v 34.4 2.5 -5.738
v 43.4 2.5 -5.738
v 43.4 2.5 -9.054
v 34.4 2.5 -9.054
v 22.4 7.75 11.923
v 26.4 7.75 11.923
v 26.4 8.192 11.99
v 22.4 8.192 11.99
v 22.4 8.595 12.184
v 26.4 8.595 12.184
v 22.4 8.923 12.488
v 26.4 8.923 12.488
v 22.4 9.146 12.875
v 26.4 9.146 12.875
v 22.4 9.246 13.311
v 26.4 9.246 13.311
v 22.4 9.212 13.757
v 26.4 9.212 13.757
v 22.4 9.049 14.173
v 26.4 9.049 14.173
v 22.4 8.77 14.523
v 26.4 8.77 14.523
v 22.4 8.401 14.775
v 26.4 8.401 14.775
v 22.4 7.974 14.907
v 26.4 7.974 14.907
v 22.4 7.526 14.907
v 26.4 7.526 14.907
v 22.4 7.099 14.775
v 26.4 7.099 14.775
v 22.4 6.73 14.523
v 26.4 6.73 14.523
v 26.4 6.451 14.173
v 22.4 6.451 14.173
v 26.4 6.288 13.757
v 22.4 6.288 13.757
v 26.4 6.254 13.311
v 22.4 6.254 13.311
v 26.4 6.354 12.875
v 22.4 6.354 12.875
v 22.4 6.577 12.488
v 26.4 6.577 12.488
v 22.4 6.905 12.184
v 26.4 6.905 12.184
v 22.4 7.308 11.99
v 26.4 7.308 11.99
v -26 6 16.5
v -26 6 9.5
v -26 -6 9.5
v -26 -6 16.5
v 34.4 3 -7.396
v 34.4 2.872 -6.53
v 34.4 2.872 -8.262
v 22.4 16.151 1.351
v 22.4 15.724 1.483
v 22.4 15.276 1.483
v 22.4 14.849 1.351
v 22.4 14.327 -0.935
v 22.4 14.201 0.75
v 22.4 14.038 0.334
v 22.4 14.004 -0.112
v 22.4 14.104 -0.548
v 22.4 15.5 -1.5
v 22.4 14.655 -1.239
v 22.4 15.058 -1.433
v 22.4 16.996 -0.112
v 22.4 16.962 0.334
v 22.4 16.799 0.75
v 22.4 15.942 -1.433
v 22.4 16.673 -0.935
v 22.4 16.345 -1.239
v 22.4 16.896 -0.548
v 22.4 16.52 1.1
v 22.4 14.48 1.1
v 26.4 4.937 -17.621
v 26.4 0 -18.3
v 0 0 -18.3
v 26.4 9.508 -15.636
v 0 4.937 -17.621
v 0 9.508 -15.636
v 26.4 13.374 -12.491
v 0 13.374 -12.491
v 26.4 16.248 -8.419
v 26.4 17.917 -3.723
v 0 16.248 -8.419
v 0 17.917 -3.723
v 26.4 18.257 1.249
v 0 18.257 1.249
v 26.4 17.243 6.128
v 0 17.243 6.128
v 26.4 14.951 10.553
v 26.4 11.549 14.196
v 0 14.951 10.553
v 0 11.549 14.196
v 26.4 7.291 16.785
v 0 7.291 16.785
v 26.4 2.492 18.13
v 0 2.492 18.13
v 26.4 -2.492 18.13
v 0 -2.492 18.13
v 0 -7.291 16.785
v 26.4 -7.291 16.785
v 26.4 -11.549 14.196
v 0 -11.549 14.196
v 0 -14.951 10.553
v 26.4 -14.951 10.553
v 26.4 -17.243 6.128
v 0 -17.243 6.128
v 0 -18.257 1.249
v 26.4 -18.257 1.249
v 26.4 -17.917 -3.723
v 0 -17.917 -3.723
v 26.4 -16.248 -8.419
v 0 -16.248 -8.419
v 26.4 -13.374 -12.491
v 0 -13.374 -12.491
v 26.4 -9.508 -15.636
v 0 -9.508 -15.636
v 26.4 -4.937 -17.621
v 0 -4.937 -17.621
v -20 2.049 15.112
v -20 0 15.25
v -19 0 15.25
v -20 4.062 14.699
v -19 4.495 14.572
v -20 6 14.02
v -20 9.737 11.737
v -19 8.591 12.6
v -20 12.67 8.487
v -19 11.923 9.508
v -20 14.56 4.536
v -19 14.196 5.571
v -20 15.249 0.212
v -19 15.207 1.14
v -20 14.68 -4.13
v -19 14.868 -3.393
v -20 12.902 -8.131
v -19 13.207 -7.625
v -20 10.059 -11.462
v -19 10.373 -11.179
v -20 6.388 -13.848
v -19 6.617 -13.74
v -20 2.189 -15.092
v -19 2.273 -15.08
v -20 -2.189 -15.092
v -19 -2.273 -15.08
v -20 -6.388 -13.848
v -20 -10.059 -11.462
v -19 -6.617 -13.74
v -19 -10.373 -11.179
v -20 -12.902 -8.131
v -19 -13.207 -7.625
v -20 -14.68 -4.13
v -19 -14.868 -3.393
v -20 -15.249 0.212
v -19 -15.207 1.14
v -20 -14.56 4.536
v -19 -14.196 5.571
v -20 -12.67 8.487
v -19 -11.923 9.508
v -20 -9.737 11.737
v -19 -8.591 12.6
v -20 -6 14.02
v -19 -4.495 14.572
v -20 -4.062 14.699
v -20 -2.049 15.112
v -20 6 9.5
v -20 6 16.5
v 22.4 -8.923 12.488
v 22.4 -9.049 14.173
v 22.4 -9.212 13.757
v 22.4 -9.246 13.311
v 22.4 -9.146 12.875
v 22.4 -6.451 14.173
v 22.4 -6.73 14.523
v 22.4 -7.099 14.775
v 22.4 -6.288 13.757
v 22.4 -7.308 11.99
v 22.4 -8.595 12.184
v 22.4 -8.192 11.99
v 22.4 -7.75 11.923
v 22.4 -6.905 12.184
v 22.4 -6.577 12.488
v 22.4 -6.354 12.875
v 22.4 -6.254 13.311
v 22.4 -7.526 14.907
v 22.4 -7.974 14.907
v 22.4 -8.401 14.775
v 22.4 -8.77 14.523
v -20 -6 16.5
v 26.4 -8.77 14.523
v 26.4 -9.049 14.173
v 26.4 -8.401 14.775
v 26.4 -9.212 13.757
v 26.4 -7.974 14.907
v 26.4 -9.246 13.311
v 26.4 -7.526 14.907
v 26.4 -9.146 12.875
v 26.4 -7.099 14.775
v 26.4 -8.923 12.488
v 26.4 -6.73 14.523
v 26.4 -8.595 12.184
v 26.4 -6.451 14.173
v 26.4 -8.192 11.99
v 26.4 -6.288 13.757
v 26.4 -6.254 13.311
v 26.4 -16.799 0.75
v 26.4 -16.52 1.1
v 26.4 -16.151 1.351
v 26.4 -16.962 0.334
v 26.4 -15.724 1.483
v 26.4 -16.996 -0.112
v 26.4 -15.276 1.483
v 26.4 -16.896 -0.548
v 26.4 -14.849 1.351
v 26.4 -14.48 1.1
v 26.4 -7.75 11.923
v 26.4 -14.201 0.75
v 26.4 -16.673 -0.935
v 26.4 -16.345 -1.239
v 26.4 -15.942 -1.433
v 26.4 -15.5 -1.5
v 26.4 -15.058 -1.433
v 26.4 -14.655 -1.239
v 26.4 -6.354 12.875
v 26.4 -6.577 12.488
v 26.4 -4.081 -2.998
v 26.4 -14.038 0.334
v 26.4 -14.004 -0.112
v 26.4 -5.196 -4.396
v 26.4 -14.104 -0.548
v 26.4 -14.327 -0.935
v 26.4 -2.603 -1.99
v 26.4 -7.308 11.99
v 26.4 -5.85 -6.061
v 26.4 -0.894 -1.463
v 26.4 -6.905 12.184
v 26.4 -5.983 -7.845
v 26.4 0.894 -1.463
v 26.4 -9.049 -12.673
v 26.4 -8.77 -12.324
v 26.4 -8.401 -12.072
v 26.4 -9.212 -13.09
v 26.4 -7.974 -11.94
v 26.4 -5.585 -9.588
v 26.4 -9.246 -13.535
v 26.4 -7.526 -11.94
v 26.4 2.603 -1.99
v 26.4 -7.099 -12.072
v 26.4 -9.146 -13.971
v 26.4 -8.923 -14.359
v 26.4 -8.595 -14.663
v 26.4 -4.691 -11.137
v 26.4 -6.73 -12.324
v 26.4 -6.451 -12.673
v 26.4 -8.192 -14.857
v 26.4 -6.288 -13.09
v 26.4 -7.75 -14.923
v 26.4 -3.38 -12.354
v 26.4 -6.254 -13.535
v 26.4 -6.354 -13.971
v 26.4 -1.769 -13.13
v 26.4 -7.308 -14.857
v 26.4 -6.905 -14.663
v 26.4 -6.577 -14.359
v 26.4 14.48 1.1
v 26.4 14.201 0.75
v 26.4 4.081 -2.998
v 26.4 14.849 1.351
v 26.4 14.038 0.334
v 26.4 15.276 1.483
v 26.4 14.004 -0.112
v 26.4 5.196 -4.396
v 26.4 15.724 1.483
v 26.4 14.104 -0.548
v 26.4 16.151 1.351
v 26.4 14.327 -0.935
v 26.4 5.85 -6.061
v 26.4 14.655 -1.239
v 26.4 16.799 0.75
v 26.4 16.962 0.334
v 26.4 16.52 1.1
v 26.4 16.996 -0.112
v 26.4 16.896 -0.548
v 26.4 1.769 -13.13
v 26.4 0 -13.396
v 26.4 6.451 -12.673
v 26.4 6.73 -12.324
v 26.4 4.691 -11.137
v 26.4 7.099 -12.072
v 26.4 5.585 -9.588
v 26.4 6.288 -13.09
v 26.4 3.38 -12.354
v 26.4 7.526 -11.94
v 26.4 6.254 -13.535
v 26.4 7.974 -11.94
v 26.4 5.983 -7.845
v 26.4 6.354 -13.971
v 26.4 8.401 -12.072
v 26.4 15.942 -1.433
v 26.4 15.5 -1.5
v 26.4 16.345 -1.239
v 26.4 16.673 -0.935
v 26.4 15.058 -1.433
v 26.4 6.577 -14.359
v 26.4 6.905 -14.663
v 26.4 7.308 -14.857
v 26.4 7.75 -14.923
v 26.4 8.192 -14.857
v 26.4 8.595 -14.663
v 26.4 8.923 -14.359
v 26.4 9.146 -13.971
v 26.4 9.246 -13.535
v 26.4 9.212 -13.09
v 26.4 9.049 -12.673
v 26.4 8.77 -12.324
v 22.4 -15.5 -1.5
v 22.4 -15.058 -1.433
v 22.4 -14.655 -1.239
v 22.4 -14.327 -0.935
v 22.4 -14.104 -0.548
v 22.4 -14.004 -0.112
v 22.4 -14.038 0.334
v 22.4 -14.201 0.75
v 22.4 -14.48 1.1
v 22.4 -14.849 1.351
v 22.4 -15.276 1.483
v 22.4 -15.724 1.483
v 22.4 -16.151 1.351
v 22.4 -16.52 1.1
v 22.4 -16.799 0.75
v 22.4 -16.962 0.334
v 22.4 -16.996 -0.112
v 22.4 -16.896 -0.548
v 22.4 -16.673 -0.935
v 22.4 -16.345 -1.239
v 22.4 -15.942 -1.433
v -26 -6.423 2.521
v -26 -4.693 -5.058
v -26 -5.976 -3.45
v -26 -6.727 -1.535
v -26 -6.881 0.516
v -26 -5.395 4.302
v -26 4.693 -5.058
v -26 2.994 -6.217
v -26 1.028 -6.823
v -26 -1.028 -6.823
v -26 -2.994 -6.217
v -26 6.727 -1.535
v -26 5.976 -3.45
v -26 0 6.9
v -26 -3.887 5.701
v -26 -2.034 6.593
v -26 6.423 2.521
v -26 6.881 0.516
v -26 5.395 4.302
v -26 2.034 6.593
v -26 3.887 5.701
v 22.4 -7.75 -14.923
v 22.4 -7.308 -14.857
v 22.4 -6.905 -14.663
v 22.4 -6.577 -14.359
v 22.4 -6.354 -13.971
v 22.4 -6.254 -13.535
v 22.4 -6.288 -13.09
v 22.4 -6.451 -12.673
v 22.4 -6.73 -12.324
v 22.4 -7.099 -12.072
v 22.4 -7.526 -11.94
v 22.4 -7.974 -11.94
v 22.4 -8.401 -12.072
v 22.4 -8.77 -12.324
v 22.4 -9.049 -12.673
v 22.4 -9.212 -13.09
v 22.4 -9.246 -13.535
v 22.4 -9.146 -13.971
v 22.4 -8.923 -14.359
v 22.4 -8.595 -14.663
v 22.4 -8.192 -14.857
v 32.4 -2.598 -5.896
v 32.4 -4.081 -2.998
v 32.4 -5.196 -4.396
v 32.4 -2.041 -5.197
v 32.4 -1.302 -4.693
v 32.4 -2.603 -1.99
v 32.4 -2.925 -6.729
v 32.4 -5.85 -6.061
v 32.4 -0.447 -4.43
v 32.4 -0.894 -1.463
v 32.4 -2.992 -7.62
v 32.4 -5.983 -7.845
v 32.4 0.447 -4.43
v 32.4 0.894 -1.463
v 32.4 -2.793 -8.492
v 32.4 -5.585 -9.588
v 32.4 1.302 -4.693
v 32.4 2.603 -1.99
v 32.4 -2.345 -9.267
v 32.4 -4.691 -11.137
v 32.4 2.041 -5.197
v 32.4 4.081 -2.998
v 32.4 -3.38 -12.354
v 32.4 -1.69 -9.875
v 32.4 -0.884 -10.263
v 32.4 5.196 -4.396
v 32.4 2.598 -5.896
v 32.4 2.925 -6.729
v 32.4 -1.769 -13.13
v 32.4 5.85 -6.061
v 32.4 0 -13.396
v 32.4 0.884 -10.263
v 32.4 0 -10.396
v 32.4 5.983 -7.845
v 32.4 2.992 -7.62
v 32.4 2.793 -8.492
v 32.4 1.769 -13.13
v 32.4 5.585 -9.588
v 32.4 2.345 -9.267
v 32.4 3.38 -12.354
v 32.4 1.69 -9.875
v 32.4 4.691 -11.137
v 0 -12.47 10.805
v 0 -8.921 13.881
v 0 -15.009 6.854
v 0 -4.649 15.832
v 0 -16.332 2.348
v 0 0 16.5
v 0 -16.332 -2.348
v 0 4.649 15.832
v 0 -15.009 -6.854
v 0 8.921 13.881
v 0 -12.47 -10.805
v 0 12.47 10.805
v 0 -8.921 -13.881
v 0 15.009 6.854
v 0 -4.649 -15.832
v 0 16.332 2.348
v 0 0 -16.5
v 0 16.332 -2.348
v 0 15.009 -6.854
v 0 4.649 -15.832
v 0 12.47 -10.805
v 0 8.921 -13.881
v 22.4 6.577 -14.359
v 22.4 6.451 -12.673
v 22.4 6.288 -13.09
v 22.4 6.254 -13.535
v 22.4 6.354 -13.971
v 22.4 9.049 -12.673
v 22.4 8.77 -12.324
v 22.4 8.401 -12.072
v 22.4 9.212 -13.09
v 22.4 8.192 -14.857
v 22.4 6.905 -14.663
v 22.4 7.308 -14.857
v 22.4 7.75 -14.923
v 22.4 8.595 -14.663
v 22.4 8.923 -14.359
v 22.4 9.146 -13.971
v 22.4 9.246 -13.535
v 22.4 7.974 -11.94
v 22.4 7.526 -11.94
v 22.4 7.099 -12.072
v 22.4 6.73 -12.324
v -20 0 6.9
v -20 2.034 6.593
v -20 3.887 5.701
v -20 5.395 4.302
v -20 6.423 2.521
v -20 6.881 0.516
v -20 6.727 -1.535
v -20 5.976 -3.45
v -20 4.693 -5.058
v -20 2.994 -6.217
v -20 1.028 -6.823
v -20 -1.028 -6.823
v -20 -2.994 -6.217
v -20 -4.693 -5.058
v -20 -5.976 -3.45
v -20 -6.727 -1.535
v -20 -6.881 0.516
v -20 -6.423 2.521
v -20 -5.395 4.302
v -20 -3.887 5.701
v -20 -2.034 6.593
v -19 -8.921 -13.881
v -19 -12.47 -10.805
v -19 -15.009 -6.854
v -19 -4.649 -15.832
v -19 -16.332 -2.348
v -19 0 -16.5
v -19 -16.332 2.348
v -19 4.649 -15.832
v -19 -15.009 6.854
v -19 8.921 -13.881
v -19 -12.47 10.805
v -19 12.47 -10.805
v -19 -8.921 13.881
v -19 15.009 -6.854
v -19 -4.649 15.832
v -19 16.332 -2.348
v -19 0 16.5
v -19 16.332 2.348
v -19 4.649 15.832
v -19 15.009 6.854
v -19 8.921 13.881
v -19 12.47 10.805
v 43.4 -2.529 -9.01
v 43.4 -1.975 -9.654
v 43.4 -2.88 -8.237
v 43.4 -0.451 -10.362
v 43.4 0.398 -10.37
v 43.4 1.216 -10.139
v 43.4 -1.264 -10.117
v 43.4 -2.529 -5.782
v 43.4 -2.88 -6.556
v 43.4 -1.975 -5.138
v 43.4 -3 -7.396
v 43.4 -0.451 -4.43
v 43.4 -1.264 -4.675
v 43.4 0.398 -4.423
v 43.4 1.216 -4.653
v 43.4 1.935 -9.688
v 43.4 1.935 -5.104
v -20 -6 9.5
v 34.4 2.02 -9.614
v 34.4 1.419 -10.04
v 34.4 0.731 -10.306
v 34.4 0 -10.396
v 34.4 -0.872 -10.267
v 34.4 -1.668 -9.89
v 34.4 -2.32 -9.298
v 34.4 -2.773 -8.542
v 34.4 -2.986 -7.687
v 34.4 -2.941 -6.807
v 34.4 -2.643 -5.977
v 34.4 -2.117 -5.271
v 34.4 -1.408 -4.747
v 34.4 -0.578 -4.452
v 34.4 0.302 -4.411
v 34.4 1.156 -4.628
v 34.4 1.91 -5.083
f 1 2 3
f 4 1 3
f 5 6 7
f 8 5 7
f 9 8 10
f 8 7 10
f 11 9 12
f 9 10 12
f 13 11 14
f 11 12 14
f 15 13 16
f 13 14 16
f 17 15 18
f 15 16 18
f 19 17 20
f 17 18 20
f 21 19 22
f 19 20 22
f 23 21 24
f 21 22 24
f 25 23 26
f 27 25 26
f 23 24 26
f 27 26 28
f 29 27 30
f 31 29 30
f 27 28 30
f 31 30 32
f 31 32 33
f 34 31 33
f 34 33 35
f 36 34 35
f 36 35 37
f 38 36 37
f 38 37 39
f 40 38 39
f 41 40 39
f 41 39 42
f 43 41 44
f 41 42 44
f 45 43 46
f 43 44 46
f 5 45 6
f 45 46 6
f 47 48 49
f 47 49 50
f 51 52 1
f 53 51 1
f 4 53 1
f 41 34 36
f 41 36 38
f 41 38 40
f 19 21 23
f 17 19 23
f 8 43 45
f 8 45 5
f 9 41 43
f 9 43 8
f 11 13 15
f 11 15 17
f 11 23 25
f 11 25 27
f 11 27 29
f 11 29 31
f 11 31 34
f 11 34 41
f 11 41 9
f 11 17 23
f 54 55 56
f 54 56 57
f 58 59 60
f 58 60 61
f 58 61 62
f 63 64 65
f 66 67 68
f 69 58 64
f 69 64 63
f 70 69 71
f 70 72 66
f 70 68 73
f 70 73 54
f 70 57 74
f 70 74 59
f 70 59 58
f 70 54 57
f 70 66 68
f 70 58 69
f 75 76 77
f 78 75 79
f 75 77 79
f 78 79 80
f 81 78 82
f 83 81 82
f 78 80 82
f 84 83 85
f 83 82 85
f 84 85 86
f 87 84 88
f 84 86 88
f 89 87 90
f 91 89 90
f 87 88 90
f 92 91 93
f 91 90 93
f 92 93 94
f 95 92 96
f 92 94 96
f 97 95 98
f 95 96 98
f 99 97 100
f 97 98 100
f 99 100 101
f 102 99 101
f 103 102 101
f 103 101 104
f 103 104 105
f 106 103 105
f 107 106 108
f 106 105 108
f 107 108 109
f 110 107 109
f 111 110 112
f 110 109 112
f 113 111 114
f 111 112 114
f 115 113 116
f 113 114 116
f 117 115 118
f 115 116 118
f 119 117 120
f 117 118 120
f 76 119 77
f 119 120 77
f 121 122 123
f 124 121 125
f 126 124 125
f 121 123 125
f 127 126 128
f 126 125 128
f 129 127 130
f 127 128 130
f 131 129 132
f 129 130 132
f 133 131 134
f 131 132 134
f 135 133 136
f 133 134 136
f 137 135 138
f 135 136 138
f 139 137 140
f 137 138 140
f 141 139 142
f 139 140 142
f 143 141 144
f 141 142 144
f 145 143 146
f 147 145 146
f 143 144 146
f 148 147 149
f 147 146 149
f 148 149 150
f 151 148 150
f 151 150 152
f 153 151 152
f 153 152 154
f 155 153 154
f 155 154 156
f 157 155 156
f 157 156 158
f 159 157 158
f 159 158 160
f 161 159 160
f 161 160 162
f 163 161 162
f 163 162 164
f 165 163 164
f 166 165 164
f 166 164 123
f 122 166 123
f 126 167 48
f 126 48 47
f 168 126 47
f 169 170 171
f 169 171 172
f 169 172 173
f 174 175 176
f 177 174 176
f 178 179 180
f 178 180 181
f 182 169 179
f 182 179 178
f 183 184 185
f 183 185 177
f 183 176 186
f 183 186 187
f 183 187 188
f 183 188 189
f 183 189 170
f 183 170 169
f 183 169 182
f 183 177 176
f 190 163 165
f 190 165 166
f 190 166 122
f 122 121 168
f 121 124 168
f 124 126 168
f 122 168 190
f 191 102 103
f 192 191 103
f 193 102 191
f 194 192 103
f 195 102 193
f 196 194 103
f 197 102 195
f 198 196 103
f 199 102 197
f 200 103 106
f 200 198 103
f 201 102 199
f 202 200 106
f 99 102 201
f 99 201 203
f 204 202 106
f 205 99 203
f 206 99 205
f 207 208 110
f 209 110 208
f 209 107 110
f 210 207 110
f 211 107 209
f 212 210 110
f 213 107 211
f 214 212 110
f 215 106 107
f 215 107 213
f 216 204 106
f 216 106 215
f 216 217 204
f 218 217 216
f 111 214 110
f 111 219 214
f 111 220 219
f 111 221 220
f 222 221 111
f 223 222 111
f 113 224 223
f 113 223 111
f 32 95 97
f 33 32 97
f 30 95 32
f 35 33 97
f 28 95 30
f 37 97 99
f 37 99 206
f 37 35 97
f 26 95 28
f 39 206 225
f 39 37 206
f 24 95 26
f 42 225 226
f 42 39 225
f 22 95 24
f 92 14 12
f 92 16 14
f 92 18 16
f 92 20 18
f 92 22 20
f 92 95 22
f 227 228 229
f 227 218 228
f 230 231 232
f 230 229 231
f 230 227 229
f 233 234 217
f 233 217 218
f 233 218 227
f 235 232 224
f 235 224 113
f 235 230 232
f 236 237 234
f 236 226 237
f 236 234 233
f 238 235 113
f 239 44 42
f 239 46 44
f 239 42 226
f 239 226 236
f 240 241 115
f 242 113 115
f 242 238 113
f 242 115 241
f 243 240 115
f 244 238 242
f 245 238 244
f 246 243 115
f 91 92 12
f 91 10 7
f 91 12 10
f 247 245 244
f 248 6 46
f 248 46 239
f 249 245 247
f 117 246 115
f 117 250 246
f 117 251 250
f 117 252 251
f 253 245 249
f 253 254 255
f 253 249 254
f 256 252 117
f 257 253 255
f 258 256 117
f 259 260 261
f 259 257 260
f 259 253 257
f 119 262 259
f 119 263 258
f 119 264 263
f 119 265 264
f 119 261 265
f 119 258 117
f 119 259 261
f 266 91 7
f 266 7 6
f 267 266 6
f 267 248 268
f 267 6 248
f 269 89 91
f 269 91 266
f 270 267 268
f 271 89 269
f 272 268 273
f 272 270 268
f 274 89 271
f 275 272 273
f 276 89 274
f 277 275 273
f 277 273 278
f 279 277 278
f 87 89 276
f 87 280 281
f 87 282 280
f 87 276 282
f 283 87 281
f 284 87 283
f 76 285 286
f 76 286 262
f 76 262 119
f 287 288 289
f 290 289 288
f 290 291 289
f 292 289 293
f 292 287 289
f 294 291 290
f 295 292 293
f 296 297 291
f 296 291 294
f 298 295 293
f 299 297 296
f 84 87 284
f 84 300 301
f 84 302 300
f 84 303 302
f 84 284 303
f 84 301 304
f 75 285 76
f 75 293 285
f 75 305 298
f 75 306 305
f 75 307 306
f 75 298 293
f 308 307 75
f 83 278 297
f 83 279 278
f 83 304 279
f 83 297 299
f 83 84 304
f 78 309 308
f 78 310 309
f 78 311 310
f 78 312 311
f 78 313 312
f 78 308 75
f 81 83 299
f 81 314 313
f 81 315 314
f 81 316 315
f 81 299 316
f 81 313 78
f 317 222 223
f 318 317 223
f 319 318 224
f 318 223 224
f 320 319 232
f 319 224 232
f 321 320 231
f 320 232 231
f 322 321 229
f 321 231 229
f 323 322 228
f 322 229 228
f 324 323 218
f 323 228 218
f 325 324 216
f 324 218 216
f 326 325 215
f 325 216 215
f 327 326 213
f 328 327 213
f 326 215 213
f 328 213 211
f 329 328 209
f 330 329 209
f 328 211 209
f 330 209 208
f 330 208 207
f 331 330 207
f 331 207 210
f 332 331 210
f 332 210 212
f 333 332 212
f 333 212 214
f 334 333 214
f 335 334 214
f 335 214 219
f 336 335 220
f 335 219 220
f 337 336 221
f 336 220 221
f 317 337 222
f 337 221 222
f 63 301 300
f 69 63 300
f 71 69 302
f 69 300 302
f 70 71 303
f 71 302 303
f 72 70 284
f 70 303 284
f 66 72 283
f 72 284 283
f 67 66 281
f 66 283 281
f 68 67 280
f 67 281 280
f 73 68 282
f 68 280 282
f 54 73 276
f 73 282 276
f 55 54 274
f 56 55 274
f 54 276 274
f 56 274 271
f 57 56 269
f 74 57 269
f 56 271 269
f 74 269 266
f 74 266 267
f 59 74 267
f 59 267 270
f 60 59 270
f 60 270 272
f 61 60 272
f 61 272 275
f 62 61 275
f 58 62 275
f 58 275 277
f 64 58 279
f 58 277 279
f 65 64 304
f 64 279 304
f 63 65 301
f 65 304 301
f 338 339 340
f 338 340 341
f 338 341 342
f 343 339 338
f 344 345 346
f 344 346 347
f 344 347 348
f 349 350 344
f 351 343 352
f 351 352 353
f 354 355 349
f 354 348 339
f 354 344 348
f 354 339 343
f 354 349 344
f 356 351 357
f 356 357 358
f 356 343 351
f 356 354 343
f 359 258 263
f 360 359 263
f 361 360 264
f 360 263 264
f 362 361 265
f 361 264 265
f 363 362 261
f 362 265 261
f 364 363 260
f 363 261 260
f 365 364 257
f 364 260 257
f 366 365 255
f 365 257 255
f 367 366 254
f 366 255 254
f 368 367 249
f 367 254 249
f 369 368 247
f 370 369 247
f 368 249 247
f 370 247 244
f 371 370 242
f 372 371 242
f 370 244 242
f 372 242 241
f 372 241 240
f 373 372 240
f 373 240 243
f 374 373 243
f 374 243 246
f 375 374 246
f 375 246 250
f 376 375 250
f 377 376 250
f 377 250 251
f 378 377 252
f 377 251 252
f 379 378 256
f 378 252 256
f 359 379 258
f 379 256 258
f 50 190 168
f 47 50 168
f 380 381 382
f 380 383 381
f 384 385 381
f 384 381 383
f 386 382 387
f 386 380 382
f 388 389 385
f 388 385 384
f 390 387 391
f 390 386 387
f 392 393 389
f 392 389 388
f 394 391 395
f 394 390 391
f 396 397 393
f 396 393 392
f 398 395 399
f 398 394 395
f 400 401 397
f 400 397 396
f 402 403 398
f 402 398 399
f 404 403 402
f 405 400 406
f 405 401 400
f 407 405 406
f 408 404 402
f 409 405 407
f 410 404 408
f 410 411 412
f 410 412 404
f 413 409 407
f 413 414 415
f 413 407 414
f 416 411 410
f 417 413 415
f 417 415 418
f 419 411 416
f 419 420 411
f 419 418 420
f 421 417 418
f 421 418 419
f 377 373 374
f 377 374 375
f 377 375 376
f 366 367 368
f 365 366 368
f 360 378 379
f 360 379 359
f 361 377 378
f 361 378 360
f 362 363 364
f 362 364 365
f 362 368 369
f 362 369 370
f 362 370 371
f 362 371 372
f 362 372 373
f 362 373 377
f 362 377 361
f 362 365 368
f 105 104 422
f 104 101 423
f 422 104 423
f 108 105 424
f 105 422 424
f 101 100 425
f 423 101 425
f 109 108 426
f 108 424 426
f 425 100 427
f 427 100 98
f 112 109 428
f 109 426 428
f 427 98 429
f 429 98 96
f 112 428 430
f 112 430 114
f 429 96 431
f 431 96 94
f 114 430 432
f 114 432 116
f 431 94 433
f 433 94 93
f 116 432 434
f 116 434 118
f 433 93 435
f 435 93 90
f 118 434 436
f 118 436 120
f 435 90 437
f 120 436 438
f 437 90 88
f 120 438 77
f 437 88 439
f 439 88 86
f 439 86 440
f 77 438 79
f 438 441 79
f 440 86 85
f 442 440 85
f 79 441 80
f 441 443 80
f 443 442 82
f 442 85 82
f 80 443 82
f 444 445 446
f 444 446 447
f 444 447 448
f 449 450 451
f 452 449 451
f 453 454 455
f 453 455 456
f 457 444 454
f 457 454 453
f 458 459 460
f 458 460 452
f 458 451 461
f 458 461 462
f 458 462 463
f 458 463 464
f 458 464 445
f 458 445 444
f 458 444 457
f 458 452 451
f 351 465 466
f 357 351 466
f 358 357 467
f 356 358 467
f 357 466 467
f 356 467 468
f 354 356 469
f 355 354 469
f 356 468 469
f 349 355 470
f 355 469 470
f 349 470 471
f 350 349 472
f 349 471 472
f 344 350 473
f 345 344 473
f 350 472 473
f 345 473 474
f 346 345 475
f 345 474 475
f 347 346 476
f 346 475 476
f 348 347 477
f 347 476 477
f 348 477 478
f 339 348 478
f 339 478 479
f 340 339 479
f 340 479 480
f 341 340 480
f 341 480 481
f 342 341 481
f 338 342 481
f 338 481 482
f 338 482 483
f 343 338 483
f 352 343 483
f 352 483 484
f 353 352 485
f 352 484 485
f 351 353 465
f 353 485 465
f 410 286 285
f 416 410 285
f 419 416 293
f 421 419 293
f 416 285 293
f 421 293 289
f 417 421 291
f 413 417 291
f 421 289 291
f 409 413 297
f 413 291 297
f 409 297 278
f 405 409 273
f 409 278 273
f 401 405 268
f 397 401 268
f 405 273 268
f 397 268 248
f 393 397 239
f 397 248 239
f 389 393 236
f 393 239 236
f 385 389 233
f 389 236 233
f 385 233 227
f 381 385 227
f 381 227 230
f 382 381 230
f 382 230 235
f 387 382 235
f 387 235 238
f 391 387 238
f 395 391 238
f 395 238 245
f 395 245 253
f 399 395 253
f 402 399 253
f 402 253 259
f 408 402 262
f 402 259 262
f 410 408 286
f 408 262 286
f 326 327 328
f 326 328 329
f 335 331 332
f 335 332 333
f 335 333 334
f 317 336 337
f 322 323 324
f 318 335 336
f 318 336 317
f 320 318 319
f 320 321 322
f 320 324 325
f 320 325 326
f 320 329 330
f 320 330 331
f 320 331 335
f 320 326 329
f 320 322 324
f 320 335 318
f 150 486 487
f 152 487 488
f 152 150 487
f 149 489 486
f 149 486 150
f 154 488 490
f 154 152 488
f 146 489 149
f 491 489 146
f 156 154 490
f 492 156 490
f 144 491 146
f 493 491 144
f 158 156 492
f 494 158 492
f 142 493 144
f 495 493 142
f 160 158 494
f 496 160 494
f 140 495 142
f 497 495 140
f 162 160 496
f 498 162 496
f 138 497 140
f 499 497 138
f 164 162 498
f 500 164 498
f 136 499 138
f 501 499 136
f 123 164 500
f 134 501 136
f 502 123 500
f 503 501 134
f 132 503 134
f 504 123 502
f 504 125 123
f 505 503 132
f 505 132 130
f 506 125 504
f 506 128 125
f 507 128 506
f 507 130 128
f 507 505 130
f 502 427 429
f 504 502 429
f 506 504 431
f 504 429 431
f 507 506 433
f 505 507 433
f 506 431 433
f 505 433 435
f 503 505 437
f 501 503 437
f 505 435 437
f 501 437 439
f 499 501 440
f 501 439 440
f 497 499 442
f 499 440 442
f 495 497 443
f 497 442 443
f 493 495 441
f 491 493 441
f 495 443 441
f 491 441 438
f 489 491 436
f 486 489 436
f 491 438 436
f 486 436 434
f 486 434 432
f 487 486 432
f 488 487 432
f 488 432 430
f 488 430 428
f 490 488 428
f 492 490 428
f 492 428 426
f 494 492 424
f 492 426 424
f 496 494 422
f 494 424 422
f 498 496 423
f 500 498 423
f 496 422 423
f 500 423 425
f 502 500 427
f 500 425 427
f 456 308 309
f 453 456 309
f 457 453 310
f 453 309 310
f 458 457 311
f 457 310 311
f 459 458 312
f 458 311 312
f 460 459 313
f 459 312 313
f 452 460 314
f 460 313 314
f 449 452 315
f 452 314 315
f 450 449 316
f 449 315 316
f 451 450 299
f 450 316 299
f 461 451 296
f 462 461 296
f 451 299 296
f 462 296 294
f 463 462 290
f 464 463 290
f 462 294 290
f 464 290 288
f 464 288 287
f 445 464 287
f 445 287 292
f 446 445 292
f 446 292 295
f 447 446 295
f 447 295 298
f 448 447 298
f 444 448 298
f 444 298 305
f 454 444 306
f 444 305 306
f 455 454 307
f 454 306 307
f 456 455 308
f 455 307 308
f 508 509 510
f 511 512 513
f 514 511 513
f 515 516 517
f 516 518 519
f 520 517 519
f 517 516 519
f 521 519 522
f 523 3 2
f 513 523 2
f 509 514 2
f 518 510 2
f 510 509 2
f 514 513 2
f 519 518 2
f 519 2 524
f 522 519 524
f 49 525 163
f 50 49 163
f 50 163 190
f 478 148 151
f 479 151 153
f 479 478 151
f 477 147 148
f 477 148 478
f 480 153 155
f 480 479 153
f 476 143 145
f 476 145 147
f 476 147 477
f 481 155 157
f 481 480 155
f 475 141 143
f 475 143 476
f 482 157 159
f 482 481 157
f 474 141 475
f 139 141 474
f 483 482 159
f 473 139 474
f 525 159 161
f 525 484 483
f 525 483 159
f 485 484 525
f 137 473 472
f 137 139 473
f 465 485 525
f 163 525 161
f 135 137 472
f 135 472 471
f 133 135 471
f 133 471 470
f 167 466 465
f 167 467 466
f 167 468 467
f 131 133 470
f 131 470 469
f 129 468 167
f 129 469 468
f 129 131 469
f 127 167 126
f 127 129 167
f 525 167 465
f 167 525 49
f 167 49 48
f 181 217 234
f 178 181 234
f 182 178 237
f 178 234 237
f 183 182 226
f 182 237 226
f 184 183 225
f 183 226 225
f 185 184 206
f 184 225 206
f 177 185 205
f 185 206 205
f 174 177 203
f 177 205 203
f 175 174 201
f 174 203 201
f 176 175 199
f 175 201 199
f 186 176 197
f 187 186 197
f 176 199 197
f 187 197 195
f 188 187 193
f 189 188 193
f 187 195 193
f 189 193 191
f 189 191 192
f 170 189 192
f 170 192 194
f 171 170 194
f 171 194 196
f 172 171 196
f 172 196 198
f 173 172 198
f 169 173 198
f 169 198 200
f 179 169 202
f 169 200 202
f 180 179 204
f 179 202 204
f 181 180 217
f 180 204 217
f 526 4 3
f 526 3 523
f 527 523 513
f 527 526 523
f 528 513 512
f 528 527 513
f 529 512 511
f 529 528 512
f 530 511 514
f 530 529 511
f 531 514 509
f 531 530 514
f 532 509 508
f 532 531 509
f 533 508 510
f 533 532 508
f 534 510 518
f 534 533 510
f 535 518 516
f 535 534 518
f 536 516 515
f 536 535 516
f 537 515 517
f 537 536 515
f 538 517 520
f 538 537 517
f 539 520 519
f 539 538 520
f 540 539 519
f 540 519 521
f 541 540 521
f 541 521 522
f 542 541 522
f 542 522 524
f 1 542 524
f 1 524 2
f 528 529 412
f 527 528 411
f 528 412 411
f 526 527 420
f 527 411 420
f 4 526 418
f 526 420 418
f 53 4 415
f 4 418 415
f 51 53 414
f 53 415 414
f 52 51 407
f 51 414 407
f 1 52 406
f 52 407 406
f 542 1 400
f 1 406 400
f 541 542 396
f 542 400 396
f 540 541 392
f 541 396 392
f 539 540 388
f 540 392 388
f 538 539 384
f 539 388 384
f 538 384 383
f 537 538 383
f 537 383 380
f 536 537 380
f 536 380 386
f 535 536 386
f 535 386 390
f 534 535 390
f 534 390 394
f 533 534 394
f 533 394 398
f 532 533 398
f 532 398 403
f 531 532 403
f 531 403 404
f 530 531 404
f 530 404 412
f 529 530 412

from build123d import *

# Parameters (mm, degrees)
SKETCH_1_R          = 18.3
EXTRUDE_1_DEPTH     = 26.4
SKETCH_4_R          = 16.5
EXTRUDE_2_DEPTH     = 19
SKETCH_5_R          = 15.25
EXTRUDE_3_DEPTH     = 1
SKETCH_6_R          = 6.9
EXTRUDE_4_DEPTH     = 6
SKETCH_7_W          = 7
SKETCH_7_H          = 12
EXTRUDE_5_DEPTH     = 6
SKETCH_3_R          = 1.5
CUT_EXTRUDE_7_DEPTH = 4
SKETCH_18_R         = 6
EXTRUDE_7_DEPTH     = 6
SKETCH_19_R         = 3
EXTRUDE_9_DEPTH     = 2
EXTRUDE_10_DEPTH    = 9


with BuildPart() as part:
    # 草图1 → 凸台-拉伸1 (new body)
    with BuildSketch(Plane(origin=(0, 0, 0), x_dir=(0, 0, -1), z_dir=(1, 0, 0))):
        Circle(SKETCH_1_R)
    extrude(amount=EXTRUDE_1_DEPTH)

    # 草图4 → 凸台-拉伸2 (add)
    with BuildSketch(Plane.ZY):
        Circle(SKETCH_4_R)
    extrude(amount=EXTRUDE_2_DEPTH)

    # 草图5 → 凸台-拉伸3 (add)
    with BuildSketch(Plane.ZY.offset(19)):
        Circle(SKETCH_5_R)
    extrude(amount=EXTRUDE_3_DEPTH)

    # 草图6 → 凸台-拉伸4 (add)
    with BuildSketch(Plane.ZY.offset(20)):
        Circle(SKETCH_6_R)
    extrude(amount=EXTRUDE_4_DEPTH)

    # 草图7 → 凸台-拉伸5 (add)
    with BuildSketch(Plane.ZY.offset(20)):
        with Locations((13, 0)):
            Rectangle(SKETCH_7_W, SKETCH_7_H)
    extrude(amount=EXTRUDE_5_DEPTH)

    # 草图3 → 切除-拉伸7 (cut)
    with BuildSketch(Plane(origin=(26.4, 0, 0), x_dir=(0, 0, -1), z_dir=(1, 0, 0))):
        with Locations((-13.423393759, 7.75)):
            Circle(SKETCH_3_R)
        with Locations((-13.423393759, -7.75)):
            Circle(SKETCH_3_R)
        with Locations((0, -15.5)):
            Circle(SKETCH_3_R)
        with Locations((13.423393759, -7.75)):
            Circle(SKETCH_3_R)
        with Locations((13.423393759, 7.75)):
            Circle(SKETCH_3_R)
        with Locations((0, 15.5)):
            Circle(SKETCH_3_R)
    extrude(amount=-CUT_EXTRUDE_7_DEPTH, mode=Mode.SUBTRACT)

    # 草图18 → 凸台-拉伸7 (add)
    with BuildSketch(Plane(origin=(26.4, 0, 0), x_dir=(0, 0, -1), z_dir=(1, 0, 0))):
        with Locations((7.396149949, 0)):
            Circle(SKETCH_18_R)
    extrude(amount=EXTRUDE_7_DEPTH)

    # 草图19 → 凸台-拉伸9 (add)
    with BuildSketch(Plane(origin=(32.4, 0, 0), x_dir=(0, 0, -1), z_dir=(1, 0, 0))):
        with Locations((7.396149949, 0)):
            Circle(SKETCH_19_R)
    extrude(amount=EXTRUDE_9_DEPTH)

    # 草图23 → 凸台-拉伸10 (add)
    with BuildSketch(Plane(origin=(34.4, 0, 0), x_dir=(0, 0, -1), z_dir=(1, 0, 0))):
        with BuildLine():
            Line((5.737938338, 2.500066849), (9.054361561, 2.500066849))
            ThreePointArc((9.054361561, 2.500066849), (7.396149949, -3), (5.737938338, 2.500066849))
        make_face()
    extrude(amount=EXTRUDE_10_DEPTH)


solid = part.part
